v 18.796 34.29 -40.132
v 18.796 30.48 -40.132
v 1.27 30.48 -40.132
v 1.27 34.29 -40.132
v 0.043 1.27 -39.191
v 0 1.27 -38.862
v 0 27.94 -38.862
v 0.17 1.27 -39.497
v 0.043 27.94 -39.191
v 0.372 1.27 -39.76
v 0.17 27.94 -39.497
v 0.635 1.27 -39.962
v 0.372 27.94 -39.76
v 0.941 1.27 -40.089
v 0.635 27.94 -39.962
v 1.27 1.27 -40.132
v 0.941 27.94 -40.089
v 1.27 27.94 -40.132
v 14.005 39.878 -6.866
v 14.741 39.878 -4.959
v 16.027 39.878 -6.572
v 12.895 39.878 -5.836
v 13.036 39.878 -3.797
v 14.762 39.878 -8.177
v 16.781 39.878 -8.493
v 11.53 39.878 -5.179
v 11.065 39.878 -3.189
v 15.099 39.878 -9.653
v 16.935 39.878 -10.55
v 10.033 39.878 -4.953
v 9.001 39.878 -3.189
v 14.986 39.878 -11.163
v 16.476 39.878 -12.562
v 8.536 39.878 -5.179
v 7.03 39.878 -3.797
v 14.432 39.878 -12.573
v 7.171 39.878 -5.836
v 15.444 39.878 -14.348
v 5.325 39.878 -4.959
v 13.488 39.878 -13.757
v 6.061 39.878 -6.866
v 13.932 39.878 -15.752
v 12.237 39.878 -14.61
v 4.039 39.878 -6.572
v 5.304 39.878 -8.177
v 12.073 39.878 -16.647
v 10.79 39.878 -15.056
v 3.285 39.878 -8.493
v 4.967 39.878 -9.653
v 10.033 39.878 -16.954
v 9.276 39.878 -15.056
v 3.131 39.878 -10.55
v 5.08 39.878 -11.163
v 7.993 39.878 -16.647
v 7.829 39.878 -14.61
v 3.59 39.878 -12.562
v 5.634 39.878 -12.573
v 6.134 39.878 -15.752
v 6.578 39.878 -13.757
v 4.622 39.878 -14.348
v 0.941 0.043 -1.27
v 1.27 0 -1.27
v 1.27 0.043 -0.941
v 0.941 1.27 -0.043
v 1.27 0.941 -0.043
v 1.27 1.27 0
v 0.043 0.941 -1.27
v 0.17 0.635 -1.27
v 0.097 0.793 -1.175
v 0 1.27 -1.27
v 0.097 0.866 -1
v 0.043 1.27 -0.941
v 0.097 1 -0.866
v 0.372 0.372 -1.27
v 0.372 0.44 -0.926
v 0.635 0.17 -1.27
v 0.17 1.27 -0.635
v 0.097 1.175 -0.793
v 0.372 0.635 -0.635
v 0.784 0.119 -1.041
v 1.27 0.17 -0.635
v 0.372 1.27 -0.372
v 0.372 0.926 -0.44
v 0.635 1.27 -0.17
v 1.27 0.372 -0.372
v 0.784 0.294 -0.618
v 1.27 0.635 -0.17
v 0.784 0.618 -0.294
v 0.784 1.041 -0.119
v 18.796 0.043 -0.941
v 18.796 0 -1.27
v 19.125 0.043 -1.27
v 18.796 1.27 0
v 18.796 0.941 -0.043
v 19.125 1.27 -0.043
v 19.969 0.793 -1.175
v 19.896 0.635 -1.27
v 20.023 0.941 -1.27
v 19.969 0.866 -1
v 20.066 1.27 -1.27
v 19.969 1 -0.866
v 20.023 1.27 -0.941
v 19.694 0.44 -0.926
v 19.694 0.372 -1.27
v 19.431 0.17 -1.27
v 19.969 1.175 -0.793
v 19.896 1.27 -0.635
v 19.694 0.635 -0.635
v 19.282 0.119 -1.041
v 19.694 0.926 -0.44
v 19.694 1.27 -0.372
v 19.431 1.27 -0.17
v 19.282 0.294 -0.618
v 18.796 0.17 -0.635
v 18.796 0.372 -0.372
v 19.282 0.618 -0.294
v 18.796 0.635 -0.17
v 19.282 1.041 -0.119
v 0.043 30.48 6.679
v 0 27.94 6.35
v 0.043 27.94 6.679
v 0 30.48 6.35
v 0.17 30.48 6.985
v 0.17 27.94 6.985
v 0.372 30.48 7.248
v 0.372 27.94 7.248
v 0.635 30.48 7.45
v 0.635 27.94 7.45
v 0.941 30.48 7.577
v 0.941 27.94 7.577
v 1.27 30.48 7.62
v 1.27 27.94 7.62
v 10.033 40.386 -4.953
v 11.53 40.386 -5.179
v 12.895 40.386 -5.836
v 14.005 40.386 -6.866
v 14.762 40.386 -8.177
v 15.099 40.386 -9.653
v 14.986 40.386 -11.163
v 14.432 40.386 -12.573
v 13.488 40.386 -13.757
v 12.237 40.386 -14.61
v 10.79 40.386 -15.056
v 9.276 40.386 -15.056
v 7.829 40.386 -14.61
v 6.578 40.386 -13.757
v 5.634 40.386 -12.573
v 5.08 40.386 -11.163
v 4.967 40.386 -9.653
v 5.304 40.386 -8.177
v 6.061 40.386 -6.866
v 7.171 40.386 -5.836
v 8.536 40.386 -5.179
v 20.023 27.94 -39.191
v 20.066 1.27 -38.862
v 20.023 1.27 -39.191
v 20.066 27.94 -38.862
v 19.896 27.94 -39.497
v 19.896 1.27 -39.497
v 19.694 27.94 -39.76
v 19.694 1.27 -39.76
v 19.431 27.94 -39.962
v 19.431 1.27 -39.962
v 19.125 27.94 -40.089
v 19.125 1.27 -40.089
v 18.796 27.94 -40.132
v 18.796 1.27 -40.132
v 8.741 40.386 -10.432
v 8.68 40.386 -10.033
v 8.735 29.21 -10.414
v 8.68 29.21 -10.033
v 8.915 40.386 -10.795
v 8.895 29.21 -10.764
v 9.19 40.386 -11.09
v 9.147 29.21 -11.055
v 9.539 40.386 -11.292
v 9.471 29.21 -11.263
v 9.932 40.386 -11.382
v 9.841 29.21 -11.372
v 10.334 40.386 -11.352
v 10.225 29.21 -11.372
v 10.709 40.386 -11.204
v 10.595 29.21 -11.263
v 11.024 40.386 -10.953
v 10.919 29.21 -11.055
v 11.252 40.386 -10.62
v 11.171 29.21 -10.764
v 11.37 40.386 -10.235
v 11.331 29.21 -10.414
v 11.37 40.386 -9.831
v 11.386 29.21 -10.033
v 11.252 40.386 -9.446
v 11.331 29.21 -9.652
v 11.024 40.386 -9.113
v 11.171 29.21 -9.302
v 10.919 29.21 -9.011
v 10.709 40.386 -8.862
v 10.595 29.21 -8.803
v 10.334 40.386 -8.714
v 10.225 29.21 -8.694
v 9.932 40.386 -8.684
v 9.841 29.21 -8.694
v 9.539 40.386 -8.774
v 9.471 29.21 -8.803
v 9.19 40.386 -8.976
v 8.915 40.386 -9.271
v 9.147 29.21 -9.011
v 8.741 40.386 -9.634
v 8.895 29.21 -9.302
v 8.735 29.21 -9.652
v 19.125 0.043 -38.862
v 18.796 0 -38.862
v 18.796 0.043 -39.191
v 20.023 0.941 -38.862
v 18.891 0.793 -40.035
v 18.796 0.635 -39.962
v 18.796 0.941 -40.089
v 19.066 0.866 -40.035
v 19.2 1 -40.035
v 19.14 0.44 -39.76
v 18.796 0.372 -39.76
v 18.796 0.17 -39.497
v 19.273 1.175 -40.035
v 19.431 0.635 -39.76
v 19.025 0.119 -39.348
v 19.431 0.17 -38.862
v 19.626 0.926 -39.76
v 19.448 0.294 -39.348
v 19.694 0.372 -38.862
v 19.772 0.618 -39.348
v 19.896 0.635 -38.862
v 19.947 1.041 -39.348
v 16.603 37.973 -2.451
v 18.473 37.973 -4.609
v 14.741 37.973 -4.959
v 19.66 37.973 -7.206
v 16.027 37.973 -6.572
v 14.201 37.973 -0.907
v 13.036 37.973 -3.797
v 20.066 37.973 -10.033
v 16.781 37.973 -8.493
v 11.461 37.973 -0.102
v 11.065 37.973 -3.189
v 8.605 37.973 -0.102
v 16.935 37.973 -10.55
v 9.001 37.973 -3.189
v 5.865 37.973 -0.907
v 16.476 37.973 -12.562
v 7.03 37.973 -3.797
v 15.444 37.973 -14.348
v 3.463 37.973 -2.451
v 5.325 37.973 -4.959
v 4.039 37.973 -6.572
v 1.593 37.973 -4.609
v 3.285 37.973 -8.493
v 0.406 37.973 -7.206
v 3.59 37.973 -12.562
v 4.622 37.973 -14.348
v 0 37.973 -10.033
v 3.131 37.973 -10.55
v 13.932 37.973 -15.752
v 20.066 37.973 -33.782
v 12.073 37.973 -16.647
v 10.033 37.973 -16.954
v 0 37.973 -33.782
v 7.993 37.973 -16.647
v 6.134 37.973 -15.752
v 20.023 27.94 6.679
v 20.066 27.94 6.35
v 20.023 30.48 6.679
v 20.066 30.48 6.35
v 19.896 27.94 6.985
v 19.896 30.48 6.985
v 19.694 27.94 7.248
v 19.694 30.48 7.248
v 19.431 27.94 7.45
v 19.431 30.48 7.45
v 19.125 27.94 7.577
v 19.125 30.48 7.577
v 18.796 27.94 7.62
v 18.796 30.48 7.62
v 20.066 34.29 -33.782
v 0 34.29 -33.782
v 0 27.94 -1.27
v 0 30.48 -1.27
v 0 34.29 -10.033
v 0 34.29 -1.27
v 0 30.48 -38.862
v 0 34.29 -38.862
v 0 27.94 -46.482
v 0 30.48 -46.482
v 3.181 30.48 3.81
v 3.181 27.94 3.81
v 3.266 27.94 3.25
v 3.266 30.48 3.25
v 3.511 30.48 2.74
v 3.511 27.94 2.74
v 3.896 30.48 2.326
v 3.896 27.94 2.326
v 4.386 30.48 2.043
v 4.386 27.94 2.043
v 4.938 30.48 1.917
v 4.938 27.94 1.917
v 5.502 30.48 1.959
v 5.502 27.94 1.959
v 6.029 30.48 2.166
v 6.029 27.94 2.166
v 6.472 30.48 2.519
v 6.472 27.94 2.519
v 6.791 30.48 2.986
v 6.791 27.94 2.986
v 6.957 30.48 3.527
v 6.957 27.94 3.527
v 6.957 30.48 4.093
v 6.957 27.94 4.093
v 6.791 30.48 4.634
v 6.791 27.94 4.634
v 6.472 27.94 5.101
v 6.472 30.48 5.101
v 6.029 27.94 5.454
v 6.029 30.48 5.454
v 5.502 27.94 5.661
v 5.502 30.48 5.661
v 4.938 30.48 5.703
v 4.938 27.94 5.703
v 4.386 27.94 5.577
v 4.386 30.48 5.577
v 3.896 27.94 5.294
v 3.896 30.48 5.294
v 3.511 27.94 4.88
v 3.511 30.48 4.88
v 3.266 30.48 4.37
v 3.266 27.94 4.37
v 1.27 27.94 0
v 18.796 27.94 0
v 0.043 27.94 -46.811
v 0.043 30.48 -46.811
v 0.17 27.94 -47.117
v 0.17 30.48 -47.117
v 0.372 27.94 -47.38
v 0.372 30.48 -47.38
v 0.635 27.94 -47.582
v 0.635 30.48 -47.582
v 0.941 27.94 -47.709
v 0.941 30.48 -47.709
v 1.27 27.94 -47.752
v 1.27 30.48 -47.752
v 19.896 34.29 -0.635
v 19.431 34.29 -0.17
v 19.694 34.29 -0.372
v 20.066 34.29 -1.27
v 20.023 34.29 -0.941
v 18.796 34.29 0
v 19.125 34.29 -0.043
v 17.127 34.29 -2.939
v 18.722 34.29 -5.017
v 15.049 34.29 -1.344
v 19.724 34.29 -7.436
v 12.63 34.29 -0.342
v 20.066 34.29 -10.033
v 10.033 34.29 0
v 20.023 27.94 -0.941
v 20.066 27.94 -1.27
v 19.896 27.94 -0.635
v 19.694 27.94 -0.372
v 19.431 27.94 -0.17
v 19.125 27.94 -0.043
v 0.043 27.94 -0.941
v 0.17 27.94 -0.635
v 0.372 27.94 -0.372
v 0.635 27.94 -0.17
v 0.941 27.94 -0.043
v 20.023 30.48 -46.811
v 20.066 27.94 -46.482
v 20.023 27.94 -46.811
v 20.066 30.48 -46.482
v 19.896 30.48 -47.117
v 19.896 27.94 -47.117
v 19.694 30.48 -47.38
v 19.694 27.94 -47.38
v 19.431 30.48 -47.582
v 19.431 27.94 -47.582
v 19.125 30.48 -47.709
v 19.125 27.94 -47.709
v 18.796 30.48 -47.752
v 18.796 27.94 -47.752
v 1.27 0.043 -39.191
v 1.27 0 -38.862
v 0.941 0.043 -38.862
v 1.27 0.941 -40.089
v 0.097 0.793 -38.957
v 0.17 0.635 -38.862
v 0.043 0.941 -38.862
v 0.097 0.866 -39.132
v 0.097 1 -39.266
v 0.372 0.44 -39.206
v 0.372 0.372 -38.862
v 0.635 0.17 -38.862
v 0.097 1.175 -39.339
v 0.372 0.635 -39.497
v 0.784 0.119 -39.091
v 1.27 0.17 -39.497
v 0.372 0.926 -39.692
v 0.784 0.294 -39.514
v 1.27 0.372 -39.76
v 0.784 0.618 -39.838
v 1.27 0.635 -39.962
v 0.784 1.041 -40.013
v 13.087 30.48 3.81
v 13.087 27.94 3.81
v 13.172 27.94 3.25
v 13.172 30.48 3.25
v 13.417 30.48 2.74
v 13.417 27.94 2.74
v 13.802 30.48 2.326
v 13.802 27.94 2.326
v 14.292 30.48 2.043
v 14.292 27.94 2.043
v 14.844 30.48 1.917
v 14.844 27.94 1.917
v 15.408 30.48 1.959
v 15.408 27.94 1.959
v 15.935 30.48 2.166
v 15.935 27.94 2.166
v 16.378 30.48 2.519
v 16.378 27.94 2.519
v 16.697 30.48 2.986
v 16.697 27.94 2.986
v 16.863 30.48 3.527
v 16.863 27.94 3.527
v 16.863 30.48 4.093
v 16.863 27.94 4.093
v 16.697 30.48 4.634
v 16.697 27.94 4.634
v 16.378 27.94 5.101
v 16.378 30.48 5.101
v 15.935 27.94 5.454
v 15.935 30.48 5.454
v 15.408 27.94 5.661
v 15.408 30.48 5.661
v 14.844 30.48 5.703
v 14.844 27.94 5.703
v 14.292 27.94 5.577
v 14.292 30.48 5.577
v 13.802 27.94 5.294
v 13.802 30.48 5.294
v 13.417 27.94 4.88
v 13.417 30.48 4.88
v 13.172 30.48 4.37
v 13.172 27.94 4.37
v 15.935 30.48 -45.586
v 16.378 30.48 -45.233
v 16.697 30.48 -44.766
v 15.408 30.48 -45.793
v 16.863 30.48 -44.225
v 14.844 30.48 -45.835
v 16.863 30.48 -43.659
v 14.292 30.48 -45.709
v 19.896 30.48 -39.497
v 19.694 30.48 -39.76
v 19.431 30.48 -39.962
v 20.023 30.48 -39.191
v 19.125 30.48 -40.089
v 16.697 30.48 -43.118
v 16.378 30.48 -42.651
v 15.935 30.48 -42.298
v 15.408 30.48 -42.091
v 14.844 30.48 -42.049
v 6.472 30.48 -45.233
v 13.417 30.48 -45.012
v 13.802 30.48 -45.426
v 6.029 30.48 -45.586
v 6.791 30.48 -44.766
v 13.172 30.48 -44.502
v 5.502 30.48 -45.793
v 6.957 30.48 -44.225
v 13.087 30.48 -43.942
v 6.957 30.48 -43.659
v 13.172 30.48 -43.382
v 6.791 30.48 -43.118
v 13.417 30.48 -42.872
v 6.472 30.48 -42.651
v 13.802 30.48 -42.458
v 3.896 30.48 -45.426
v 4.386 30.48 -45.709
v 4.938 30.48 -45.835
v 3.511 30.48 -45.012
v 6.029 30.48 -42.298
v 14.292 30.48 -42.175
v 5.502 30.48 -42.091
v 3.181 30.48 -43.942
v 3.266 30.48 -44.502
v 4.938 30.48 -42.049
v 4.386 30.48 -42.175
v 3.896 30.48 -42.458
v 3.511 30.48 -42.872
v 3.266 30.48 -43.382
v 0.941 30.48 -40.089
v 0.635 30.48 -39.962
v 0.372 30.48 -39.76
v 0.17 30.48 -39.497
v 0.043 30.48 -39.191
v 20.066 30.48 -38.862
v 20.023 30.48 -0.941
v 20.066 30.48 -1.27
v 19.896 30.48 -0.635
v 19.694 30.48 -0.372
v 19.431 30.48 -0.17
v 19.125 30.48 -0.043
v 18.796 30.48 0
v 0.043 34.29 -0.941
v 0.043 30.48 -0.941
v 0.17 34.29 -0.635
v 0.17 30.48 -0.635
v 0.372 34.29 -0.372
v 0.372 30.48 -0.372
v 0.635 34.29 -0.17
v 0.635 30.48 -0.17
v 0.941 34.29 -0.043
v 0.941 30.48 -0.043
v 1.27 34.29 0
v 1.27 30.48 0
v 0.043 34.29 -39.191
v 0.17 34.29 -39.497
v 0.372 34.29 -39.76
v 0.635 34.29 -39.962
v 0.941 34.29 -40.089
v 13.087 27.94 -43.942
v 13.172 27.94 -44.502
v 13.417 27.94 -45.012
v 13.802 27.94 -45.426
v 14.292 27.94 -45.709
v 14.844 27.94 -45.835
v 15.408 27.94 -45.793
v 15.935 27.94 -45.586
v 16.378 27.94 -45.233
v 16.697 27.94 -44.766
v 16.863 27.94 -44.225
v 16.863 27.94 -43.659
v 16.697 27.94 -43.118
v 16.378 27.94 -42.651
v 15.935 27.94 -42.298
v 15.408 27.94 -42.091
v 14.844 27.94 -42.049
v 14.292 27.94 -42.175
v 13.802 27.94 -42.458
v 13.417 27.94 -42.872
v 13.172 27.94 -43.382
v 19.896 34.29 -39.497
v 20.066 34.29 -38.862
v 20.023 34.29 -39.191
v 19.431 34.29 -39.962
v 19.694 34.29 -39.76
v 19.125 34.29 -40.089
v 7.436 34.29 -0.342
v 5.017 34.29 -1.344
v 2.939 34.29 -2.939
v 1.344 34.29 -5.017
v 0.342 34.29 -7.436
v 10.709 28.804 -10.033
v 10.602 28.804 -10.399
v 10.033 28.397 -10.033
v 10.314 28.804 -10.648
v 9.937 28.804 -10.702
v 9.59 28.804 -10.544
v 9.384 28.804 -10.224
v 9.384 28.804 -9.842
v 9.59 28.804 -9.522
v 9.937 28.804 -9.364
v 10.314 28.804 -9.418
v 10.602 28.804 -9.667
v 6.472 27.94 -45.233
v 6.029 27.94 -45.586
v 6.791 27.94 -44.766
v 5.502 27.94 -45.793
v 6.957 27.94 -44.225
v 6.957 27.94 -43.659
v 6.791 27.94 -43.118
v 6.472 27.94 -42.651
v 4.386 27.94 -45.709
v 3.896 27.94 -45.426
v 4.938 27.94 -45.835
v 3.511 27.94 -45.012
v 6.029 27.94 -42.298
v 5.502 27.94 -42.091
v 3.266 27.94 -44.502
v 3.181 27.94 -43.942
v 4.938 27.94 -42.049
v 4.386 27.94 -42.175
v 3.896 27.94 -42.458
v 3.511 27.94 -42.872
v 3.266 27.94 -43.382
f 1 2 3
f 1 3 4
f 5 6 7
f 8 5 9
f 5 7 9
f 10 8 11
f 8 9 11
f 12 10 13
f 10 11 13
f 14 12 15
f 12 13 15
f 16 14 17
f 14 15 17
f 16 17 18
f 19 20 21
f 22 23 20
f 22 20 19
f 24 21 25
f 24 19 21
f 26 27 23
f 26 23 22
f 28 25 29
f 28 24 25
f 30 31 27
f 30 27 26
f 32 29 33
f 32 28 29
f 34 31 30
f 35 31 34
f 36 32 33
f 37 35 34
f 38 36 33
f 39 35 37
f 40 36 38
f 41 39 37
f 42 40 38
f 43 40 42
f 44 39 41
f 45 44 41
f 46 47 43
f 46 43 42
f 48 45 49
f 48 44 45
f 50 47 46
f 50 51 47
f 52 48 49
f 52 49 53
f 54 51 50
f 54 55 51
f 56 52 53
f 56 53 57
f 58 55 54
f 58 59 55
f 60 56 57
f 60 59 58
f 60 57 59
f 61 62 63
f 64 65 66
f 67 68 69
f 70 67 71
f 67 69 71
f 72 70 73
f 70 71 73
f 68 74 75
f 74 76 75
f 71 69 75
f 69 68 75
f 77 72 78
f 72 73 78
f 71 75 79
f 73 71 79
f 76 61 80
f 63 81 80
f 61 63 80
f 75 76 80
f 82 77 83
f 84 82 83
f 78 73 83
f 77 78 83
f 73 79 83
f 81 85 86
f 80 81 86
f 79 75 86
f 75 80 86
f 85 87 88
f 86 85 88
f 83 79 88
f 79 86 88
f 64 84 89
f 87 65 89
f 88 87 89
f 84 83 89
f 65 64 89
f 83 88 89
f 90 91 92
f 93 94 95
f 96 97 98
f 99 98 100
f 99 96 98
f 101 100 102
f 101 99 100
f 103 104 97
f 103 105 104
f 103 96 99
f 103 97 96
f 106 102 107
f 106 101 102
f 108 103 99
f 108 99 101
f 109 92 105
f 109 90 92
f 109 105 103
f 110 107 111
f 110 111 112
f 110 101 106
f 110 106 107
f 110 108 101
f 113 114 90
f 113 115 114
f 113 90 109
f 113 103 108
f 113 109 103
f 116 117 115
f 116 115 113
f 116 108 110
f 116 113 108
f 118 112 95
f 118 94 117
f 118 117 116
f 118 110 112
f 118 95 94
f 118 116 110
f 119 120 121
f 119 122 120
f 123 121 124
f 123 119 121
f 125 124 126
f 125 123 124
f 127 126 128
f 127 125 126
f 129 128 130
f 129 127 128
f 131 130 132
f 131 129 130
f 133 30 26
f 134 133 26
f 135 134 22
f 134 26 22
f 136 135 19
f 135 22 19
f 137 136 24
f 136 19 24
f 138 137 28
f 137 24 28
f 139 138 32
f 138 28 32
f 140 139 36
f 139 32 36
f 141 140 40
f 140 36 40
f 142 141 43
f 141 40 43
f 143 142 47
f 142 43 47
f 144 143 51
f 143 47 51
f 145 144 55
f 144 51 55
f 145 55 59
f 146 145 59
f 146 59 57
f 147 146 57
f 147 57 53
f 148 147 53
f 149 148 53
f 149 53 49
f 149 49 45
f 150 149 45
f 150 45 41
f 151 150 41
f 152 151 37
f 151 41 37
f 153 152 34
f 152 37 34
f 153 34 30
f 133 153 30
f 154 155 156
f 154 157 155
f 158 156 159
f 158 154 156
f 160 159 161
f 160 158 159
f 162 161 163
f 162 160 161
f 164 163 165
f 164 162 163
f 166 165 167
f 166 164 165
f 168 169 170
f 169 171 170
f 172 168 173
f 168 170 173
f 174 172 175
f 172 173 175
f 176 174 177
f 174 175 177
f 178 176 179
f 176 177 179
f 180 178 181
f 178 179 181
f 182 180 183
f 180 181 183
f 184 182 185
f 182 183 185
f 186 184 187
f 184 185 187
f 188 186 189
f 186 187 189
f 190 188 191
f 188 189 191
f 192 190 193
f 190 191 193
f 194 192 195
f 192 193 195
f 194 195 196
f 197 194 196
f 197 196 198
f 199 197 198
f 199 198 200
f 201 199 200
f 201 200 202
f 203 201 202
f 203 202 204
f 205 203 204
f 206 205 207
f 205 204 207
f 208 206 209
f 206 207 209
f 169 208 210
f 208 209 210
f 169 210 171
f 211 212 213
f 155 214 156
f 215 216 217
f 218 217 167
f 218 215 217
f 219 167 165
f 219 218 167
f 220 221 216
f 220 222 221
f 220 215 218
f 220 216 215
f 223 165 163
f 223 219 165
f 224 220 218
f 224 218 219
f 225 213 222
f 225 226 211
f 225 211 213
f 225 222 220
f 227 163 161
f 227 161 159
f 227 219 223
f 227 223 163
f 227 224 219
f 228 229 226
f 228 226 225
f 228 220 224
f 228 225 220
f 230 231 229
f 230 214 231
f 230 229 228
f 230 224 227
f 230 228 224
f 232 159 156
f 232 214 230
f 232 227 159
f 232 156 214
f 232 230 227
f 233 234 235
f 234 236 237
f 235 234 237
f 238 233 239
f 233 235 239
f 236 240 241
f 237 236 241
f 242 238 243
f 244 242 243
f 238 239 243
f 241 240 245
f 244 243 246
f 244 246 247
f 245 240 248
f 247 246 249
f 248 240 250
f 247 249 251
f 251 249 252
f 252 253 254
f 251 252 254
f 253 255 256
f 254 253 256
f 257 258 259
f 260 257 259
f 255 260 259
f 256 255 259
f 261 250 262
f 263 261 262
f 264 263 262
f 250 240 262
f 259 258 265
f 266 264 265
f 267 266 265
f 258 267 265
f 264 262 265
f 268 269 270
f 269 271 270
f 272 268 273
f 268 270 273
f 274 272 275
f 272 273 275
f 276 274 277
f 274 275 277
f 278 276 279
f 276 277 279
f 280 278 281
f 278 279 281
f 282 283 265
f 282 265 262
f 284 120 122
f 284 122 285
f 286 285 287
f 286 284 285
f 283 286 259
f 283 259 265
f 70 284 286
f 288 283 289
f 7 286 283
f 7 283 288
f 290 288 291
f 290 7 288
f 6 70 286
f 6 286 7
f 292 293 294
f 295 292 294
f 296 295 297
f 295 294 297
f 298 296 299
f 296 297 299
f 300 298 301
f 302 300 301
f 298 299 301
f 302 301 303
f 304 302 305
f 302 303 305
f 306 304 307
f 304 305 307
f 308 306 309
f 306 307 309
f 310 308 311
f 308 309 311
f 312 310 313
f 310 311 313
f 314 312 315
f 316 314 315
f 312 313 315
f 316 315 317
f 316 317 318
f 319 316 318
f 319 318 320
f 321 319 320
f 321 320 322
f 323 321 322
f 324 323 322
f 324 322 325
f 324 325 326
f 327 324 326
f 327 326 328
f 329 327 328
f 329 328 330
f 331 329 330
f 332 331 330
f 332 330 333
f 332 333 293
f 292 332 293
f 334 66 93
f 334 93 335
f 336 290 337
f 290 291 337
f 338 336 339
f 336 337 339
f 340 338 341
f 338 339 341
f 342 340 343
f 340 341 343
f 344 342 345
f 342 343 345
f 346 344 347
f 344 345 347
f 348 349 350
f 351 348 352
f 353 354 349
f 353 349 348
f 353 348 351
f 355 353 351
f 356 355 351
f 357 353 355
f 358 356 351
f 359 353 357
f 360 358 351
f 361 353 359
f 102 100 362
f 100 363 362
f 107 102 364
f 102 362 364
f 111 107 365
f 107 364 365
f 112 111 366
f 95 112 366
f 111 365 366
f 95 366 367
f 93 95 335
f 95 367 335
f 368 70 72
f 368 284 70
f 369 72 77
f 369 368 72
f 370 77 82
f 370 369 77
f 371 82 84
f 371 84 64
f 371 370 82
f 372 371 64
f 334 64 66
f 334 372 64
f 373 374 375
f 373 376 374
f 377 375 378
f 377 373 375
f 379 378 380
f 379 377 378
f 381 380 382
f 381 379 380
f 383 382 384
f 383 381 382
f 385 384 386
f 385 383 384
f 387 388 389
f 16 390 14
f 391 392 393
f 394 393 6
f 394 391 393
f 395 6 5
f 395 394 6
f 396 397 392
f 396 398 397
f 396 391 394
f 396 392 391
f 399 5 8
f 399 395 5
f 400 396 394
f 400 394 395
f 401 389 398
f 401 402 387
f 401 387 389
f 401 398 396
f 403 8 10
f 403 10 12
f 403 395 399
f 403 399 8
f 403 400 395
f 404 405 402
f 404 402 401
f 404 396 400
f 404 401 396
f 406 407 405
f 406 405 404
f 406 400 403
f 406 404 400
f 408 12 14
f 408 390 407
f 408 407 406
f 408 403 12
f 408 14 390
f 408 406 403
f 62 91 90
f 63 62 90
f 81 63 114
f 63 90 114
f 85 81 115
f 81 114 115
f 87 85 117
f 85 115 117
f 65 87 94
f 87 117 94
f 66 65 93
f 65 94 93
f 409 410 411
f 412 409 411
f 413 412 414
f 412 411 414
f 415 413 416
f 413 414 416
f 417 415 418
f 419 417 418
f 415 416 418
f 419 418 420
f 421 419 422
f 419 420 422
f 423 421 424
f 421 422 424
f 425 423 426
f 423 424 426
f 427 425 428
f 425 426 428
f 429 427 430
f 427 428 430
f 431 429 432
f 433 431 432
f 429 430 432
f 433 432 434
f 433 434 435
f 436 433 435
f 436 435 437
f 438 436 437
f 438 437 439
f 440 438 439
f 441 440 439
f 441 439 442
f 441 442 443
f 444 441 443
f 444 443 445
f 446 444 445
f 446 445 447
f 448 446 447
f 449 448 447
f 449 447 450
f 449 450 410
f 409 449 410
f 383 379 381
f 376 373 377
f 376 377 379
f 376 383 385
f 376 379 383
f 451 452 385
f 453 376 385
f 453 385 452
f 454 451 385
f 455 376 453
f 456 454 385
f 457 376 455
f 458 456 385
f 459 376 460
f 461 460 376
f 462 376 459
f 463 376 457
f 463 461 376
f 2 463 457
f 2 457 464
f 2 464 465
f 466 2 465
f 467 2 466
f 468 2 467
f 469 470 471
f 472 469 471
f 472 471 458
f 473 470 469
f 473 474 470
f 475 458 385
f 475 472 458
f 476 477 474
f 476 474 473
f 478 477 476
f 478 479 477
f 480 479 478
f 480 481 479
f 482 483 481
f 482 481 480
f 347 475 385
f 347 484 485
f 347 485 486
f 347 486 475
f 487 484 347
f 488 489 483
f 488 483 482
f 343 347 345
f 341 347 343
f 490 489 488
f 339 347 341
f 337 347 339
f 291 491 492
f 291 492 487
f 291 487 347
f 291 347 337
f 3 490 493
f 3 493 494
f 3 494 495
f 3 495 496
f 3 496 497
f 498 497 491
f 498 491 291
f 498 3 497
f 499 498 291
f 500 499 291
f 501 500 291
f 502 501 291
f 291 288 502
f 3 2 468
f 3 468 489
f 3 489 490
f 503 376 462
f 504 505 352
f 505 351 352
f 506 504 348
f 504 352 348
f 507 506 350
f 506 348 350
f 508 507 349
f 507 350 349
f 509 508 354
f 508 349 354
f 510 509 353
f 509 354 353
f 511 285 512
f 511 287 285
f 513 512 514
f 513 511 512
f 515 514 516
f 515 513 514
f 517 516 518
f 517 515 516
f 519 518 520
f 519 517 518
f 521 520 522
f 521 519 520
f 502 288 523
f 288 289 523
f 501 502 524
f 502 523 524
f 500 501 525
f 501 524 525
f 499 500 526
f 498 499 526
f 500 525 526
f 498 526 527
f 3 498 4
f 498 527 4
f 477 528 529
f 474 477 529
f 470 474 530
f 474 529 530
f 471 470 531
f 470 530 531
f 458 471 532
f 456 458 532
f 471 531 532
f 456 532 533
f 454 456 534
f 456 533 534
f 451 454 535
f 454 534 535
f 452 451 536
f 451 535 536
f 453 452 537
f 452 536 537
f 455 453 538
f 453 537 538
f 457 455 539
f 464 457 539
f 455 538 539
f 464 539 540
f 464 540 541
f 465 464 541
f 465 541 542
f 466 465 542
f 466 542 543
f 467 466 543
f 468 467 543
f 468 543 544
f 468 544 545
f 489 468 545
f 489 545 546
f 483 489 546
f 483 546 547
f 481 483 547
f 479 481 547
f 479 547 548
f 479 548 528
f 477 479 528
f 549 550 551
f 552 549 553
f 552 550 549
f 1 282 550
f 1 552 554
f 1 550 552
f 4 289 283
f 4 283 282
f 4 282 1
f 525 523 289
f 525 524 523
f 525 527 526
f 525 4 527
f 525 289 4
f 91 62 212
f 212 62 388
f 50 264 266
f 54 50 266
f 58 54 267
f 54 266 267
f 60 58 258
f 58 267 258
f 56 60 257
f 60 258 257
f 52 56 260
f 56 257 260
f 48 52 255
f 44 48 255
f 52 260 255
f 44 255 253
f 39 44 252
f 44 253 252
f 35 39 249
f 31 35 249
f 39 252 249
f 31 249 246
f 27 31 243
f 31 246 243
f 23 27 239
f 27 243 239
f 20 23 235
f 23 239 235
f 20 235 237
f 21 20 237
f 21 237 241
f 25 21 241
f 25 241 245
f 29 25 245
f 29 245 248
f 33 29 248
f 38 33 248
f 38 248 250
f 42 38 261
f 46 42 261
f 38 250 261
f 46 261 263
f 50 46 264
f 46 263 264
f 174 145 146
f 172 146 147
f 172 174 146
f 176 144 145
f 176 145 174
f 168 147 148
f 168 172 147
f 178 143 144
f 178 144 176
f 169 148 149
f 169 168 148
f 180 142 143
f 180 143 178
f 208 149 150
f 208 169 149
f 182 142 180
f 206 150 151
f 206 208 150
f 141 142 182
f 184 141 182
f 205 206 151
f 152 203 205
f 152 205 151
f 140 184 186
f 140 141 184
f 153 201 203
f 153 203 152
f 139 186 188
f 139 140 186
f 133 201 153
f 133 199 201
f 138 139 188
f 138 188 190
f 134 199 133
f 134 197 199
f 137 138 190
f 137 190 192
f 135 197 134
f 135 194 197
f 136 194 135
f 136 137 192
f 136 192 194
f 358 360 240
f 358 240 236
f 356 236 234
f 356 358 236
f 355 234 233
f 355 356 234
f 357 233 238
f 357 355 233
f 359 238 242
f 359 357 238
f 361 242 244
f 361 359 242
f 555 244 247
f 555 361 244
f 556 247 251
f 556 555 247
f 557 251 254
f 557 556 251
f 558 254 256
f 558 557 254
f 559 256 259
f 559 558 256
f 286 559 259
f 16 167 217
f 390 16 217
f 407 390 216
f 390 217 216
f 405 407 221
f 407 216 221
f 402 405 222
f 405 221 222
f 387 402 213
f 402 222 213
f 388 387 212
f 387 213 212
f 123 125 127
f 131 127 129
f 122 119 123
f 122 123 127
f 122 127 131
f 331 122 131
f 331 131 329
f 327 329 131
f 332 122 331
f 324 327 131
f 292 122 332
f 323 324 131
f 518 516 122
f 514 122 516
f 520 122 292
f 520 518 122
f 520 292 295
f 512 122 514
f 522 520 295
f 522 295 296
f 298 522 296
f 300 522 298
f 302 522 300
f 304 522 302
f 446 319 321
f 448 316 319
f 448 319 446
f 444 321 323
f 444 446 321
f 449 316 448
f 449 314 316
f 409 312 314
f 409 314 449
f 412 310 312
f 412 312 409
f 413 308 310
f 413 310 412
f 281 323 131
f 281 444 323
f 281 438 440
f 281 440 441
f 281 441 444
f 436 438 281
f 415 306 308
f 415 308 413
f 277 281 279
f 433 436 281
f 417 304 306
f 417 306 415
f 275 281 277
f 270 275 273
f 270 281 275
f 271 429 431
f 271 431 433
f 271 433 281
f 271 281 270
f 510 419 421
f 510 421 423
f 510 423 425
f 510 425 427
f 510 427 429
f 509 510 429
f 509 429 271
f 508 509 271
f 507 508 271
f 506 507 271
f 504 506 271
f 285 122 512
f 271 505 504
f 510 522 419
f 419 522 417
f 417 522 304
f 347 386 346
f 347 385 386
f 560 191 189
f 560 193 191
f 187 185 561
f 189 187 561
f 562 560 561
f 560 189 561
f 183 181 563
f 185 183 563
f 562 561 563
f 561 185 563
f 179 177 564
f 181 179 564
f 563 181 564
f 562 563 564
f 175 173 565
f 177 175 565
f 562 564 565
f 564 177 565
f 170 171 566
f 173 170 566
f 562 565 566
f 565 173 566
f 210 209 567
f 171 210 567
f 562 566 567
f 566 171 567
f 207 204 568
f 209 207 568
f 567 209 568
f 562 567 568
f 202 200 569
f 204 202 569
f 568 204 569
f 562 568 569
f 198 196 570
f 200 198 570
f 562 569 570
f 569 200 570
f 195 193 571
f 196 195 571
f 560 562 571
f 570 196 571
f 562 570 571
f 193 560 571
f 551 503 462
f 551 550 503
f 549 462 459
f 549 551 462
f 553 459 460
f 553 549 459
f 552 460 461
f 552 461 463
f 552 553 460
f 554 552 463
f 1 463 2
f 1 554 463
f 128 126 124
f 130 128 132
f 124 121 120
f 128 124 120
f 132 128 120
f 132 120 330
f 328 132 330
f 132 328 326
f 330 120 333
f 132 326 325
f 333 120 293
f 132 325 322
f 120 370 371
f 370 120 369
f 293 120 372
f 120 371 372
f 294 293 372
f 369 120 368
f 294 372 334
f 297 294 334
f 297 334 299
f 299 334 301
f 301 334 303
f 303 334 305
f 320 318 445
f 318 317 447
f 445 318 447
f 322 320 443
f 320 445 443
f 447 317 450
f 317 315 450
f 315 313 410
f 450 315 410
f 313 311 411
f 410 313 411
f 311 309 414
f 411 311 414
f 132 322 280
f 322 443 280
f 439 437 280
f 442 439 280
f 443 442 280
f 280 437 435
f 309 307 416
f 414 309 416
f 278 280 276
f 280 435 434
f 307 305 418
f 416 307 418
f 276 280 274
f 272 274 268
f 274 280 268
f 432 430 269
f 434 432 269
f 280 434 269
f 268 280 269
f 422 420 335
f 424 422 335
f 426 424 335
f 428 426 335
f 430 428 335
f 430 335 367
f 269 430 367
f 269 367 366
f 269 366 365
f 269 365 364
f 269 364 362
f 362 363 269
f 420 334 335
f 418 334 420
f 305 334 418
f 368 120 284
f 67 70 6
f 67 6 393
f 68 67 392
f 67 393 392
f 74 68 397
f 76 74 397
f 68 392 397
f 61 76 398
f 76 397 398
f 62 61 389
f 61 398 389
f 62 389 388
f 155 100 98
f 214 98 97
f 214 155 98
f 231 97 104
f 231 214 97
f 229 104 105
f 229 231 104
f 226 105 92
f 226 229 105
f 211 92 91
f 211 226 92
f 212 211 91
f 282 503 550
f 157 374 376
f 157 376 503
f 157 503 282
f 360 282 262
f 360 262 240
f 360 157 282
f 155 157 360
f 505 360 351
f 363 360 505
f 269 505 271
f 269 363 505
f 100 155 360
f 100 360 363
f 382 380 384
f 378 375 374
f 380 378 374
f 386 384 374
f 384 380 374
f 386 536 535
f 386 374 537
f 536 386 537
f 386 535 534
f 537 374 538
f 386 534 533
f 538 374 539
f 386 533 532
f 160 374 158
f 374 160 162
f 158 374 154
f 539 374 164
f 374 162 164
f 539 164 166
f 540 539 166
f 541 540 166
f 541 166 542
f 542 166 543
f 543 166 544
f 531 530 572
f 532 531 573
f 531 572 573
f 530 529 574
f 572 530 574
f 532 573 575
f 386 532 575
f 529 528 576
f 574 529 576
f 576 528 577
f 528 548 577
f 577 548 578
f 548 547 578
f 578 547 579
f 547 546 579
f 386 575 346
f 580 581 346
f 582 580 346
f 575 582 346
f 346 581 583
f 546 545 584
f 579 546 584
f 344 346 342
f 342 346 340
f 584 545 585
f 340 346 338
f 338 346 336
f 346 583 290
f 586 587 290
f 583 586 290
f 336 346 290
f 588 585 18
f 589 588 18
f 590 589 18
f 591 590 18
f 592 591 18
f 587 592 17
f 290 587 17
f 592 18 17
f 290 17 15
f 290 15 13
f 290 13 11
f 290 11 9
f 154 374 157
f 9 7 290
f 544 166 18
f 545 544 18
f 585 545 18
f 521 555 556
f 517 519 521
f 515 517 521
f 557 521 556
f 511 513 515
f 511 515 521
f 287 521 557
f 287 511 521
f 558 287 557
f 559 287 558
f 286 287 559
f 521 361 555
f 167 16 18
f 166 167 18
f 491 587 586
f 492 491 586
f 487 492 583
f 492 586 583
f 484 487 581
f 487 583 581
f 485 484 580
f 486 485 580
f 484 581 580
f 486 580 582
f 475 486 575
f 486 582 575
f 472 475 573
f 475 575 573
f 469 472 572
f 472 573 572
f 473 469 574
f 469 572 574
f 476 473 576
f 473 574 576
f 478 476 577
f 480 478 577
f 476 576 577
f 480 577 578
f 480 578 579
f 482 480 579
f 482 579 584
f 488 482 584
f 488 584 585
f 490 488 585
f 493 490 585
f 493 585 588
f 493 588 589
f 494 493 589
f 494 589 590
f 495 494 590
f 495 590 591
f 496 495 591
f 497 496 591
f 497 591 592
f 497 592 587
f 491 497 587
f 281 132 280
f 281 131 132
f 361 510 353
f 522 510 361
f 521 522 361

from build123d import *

# Parameters (mm, degrees)
SKETCH1_W                 = 40.132
SKETCH1_H                 = 34.29
BOSS_EXTRUDE1_DEPTH       = 20.066
BOSS_EXTRUDE2_DEPTH       = 3.683
SKETCH3_R                 = 6.9215
BOSS_EXTRUDE3_DEPTH       = 1.905
SKETCH4_R                 = 5.08
BOSS_EXTRUDE4_DEPTH       = 0.508
F_6_32_TAPPED_HOLE1_D     = 2.7051
F_6_32_TAPPED_HOLE1_DEPTH = 11.176
F_6_32_TAPPED_HOLE1_TIP   = 0.81269403
SKETCH8_W                 = 20.066
SKETCH8_H                 = 2.54
BOSS_EXTRUDE5_DEPTH       = 7.62
SKETCH9_W                 = 20.066
SKETCH9_H                 = 2.54
BOSS_EXTRUDE6_DEPTH       = 7.62
F_6_CLEARANCE_HOLE1_D     = 3.7973
F_6_CLEARANCE_HOLE1_DEPTH = 3.81
F_6_CLEARANCE_HOLE1_TIP   = 1.140824014
FILLET1_R                 = 1.27


with BuildPart() as part:
    # Sketch1 → Boss-Extrude1 (new body)
    with BuildSketch(Plane(origin=(0, 0, 0), x_dir=(0, 0, -1), z_dir=(1, 0, 0))):
        with Locations((20.066, 17.145)):
            Rectangle(SKETCH1_W, SKETCH1_H)
    extrude(amount=BOSS_EXTRUDE1_DEPTH)

    # Sketch2 → Boss-Extrude2 (add)
    with BuildSketch(Plane(origin=(0, 34.29, 0), x_dir=(1, 0, 0), z_dir=(0, 1, 0))):
        with BuildLine():
            Line((0, 33.782), (20.066, 33.782))
            Line((20.066, 33.782), (20.066, 10.033))
            ThreePointArc((20.066, 10.033), (10.033, 0), (0, 10.033))
            Line((0, 10.033), (0, 33.782))
        make_face()
    extrude(amount=BOSS_EXTRUDE2_DEPTH)

    # Sketch3 → Boss-Extrude3 (add)
    with BuildSketch(Plane(origin=(0, 37.973, 0), x_dir=(1, 0, 0), z_dir=(0, 1, 0))):
        with Locations(Location((10.033, 10.033, 0), (0, 0, 90))):
            Circle(SKETCH3_R)
    extrude(amount=BOSS_EXTRUDE3_DEPTH)

    # Sketch4 → Boss-Extrude4 (add)
    with BuildSketch(Plane(origin=(0, 39.878, 0), x_dir=(1, 0, 0), z_dir=(0, 1, 0))):
        with Locations(Location((10.033, 10.033, 0), (0, 0, 270))):
            Circle(SKETCH4_R)
    extrude(amount=BOSS_EXTRUDE4_DEPTH)

    # #6-32 Tapped Hole1
    with Locations(Plane(origin=(0, 40.386, 0), x_dir=(1, 0, 0), z_dir=(0, 1, 0))):
        with Locations((10.033, 10.033)):
            Hole(F_6_32_TAPPED_HOLE1_D / 2, depth=F_6_32_TAPPED_HOLE1_DEPTH)
            with Locations((0, 0, -(F_6_32_TAPPED_HOLE1_DEPTH + F_6_32_TAPPED_HOLE1_TIP / 2))):  # 118° drill point
                Cone(0, F_6_32_TAPPED_HOLE1_D / 2, F_6_32_TAPPED_HOLE1_TIP, mode=Mode.SUBTRACT)

    # Sketch8 → Boss-Extrude5 (add)
    with BuildSketch(Plane.XY):
        with Locations((10.033, 29.21)):
            Rectangle(SKETCH8_W, SKETCH8_H)
    extrude(amount=BOSS_EXTRUDE5_DEPTH)

    # Sketch9 → Boss-Extrude6 (add)
    with BuildSketch(Plane(origin=(0, 0, -40.132), x_dir=(-1, 0, 0), z_dir=(0, 0, -1))):
        with Locations((-10.033, 29.21)):
            Rectangle(SKETCH9_W, SKETCH9_H)
    extrude(amount=BOSS_EXTRUDE6_DEPTH)

    # #6 Clearance Hole1
    with Locations(Plane(origin=(0, 30.48, 0), x_dir=(1, 0, 0), z_dir=(0, 1, 0))):
        with Locations((14.986, -3.81), (5.08, -3.81), (5.08, 43.942), (14.986, 43.942)):
            Hole(F_6_CLEARANCE_HOLE1_D / 2, depth=F_6_CLEARANCE_HOLE1_DEPTH)
            with Locations((0, 0, -(F_6_CLEARANCE_HOLE1_DEPTH + F_6_CLEARANCE_HOLE1_TIP / 2))):  # 118° drill point
                Cone(0, F_6_CLEARANCE_HOLE1_D / 2, F_6_CLEARANCE_HOLE1_TIP, mode=Mode.SUBTRACT)

    # Fillet1
    fillet1_edges = [part.edges().sort_by_distance(p)[0] for p in [
        (10.033, 0, 0),
        (20.066, 0, -20.066),
        (10.033, 0, -40.132),
        (0, 0, -20.066),
        (0, 32.385, -40.132),
        (0, 13.97, -40.132),
        (20.066, 13.97, -40.132),
        (20.066, 32.385, -40.132),
        (20.066, 32.385, 0),
        (20.066, 13.97, 0),
        (0, 32.385, 0),
        (0, 13.97, 0),
        (20.066, 29.21, -47.752),
        (0, 29.21, -47.752),
        (20.066, 29.21, 7.62),
        (0, 29.21, 7.62),
    ]]
    fillet(fillet1_edges, radius=FILLET1_R)


solid = part.part
